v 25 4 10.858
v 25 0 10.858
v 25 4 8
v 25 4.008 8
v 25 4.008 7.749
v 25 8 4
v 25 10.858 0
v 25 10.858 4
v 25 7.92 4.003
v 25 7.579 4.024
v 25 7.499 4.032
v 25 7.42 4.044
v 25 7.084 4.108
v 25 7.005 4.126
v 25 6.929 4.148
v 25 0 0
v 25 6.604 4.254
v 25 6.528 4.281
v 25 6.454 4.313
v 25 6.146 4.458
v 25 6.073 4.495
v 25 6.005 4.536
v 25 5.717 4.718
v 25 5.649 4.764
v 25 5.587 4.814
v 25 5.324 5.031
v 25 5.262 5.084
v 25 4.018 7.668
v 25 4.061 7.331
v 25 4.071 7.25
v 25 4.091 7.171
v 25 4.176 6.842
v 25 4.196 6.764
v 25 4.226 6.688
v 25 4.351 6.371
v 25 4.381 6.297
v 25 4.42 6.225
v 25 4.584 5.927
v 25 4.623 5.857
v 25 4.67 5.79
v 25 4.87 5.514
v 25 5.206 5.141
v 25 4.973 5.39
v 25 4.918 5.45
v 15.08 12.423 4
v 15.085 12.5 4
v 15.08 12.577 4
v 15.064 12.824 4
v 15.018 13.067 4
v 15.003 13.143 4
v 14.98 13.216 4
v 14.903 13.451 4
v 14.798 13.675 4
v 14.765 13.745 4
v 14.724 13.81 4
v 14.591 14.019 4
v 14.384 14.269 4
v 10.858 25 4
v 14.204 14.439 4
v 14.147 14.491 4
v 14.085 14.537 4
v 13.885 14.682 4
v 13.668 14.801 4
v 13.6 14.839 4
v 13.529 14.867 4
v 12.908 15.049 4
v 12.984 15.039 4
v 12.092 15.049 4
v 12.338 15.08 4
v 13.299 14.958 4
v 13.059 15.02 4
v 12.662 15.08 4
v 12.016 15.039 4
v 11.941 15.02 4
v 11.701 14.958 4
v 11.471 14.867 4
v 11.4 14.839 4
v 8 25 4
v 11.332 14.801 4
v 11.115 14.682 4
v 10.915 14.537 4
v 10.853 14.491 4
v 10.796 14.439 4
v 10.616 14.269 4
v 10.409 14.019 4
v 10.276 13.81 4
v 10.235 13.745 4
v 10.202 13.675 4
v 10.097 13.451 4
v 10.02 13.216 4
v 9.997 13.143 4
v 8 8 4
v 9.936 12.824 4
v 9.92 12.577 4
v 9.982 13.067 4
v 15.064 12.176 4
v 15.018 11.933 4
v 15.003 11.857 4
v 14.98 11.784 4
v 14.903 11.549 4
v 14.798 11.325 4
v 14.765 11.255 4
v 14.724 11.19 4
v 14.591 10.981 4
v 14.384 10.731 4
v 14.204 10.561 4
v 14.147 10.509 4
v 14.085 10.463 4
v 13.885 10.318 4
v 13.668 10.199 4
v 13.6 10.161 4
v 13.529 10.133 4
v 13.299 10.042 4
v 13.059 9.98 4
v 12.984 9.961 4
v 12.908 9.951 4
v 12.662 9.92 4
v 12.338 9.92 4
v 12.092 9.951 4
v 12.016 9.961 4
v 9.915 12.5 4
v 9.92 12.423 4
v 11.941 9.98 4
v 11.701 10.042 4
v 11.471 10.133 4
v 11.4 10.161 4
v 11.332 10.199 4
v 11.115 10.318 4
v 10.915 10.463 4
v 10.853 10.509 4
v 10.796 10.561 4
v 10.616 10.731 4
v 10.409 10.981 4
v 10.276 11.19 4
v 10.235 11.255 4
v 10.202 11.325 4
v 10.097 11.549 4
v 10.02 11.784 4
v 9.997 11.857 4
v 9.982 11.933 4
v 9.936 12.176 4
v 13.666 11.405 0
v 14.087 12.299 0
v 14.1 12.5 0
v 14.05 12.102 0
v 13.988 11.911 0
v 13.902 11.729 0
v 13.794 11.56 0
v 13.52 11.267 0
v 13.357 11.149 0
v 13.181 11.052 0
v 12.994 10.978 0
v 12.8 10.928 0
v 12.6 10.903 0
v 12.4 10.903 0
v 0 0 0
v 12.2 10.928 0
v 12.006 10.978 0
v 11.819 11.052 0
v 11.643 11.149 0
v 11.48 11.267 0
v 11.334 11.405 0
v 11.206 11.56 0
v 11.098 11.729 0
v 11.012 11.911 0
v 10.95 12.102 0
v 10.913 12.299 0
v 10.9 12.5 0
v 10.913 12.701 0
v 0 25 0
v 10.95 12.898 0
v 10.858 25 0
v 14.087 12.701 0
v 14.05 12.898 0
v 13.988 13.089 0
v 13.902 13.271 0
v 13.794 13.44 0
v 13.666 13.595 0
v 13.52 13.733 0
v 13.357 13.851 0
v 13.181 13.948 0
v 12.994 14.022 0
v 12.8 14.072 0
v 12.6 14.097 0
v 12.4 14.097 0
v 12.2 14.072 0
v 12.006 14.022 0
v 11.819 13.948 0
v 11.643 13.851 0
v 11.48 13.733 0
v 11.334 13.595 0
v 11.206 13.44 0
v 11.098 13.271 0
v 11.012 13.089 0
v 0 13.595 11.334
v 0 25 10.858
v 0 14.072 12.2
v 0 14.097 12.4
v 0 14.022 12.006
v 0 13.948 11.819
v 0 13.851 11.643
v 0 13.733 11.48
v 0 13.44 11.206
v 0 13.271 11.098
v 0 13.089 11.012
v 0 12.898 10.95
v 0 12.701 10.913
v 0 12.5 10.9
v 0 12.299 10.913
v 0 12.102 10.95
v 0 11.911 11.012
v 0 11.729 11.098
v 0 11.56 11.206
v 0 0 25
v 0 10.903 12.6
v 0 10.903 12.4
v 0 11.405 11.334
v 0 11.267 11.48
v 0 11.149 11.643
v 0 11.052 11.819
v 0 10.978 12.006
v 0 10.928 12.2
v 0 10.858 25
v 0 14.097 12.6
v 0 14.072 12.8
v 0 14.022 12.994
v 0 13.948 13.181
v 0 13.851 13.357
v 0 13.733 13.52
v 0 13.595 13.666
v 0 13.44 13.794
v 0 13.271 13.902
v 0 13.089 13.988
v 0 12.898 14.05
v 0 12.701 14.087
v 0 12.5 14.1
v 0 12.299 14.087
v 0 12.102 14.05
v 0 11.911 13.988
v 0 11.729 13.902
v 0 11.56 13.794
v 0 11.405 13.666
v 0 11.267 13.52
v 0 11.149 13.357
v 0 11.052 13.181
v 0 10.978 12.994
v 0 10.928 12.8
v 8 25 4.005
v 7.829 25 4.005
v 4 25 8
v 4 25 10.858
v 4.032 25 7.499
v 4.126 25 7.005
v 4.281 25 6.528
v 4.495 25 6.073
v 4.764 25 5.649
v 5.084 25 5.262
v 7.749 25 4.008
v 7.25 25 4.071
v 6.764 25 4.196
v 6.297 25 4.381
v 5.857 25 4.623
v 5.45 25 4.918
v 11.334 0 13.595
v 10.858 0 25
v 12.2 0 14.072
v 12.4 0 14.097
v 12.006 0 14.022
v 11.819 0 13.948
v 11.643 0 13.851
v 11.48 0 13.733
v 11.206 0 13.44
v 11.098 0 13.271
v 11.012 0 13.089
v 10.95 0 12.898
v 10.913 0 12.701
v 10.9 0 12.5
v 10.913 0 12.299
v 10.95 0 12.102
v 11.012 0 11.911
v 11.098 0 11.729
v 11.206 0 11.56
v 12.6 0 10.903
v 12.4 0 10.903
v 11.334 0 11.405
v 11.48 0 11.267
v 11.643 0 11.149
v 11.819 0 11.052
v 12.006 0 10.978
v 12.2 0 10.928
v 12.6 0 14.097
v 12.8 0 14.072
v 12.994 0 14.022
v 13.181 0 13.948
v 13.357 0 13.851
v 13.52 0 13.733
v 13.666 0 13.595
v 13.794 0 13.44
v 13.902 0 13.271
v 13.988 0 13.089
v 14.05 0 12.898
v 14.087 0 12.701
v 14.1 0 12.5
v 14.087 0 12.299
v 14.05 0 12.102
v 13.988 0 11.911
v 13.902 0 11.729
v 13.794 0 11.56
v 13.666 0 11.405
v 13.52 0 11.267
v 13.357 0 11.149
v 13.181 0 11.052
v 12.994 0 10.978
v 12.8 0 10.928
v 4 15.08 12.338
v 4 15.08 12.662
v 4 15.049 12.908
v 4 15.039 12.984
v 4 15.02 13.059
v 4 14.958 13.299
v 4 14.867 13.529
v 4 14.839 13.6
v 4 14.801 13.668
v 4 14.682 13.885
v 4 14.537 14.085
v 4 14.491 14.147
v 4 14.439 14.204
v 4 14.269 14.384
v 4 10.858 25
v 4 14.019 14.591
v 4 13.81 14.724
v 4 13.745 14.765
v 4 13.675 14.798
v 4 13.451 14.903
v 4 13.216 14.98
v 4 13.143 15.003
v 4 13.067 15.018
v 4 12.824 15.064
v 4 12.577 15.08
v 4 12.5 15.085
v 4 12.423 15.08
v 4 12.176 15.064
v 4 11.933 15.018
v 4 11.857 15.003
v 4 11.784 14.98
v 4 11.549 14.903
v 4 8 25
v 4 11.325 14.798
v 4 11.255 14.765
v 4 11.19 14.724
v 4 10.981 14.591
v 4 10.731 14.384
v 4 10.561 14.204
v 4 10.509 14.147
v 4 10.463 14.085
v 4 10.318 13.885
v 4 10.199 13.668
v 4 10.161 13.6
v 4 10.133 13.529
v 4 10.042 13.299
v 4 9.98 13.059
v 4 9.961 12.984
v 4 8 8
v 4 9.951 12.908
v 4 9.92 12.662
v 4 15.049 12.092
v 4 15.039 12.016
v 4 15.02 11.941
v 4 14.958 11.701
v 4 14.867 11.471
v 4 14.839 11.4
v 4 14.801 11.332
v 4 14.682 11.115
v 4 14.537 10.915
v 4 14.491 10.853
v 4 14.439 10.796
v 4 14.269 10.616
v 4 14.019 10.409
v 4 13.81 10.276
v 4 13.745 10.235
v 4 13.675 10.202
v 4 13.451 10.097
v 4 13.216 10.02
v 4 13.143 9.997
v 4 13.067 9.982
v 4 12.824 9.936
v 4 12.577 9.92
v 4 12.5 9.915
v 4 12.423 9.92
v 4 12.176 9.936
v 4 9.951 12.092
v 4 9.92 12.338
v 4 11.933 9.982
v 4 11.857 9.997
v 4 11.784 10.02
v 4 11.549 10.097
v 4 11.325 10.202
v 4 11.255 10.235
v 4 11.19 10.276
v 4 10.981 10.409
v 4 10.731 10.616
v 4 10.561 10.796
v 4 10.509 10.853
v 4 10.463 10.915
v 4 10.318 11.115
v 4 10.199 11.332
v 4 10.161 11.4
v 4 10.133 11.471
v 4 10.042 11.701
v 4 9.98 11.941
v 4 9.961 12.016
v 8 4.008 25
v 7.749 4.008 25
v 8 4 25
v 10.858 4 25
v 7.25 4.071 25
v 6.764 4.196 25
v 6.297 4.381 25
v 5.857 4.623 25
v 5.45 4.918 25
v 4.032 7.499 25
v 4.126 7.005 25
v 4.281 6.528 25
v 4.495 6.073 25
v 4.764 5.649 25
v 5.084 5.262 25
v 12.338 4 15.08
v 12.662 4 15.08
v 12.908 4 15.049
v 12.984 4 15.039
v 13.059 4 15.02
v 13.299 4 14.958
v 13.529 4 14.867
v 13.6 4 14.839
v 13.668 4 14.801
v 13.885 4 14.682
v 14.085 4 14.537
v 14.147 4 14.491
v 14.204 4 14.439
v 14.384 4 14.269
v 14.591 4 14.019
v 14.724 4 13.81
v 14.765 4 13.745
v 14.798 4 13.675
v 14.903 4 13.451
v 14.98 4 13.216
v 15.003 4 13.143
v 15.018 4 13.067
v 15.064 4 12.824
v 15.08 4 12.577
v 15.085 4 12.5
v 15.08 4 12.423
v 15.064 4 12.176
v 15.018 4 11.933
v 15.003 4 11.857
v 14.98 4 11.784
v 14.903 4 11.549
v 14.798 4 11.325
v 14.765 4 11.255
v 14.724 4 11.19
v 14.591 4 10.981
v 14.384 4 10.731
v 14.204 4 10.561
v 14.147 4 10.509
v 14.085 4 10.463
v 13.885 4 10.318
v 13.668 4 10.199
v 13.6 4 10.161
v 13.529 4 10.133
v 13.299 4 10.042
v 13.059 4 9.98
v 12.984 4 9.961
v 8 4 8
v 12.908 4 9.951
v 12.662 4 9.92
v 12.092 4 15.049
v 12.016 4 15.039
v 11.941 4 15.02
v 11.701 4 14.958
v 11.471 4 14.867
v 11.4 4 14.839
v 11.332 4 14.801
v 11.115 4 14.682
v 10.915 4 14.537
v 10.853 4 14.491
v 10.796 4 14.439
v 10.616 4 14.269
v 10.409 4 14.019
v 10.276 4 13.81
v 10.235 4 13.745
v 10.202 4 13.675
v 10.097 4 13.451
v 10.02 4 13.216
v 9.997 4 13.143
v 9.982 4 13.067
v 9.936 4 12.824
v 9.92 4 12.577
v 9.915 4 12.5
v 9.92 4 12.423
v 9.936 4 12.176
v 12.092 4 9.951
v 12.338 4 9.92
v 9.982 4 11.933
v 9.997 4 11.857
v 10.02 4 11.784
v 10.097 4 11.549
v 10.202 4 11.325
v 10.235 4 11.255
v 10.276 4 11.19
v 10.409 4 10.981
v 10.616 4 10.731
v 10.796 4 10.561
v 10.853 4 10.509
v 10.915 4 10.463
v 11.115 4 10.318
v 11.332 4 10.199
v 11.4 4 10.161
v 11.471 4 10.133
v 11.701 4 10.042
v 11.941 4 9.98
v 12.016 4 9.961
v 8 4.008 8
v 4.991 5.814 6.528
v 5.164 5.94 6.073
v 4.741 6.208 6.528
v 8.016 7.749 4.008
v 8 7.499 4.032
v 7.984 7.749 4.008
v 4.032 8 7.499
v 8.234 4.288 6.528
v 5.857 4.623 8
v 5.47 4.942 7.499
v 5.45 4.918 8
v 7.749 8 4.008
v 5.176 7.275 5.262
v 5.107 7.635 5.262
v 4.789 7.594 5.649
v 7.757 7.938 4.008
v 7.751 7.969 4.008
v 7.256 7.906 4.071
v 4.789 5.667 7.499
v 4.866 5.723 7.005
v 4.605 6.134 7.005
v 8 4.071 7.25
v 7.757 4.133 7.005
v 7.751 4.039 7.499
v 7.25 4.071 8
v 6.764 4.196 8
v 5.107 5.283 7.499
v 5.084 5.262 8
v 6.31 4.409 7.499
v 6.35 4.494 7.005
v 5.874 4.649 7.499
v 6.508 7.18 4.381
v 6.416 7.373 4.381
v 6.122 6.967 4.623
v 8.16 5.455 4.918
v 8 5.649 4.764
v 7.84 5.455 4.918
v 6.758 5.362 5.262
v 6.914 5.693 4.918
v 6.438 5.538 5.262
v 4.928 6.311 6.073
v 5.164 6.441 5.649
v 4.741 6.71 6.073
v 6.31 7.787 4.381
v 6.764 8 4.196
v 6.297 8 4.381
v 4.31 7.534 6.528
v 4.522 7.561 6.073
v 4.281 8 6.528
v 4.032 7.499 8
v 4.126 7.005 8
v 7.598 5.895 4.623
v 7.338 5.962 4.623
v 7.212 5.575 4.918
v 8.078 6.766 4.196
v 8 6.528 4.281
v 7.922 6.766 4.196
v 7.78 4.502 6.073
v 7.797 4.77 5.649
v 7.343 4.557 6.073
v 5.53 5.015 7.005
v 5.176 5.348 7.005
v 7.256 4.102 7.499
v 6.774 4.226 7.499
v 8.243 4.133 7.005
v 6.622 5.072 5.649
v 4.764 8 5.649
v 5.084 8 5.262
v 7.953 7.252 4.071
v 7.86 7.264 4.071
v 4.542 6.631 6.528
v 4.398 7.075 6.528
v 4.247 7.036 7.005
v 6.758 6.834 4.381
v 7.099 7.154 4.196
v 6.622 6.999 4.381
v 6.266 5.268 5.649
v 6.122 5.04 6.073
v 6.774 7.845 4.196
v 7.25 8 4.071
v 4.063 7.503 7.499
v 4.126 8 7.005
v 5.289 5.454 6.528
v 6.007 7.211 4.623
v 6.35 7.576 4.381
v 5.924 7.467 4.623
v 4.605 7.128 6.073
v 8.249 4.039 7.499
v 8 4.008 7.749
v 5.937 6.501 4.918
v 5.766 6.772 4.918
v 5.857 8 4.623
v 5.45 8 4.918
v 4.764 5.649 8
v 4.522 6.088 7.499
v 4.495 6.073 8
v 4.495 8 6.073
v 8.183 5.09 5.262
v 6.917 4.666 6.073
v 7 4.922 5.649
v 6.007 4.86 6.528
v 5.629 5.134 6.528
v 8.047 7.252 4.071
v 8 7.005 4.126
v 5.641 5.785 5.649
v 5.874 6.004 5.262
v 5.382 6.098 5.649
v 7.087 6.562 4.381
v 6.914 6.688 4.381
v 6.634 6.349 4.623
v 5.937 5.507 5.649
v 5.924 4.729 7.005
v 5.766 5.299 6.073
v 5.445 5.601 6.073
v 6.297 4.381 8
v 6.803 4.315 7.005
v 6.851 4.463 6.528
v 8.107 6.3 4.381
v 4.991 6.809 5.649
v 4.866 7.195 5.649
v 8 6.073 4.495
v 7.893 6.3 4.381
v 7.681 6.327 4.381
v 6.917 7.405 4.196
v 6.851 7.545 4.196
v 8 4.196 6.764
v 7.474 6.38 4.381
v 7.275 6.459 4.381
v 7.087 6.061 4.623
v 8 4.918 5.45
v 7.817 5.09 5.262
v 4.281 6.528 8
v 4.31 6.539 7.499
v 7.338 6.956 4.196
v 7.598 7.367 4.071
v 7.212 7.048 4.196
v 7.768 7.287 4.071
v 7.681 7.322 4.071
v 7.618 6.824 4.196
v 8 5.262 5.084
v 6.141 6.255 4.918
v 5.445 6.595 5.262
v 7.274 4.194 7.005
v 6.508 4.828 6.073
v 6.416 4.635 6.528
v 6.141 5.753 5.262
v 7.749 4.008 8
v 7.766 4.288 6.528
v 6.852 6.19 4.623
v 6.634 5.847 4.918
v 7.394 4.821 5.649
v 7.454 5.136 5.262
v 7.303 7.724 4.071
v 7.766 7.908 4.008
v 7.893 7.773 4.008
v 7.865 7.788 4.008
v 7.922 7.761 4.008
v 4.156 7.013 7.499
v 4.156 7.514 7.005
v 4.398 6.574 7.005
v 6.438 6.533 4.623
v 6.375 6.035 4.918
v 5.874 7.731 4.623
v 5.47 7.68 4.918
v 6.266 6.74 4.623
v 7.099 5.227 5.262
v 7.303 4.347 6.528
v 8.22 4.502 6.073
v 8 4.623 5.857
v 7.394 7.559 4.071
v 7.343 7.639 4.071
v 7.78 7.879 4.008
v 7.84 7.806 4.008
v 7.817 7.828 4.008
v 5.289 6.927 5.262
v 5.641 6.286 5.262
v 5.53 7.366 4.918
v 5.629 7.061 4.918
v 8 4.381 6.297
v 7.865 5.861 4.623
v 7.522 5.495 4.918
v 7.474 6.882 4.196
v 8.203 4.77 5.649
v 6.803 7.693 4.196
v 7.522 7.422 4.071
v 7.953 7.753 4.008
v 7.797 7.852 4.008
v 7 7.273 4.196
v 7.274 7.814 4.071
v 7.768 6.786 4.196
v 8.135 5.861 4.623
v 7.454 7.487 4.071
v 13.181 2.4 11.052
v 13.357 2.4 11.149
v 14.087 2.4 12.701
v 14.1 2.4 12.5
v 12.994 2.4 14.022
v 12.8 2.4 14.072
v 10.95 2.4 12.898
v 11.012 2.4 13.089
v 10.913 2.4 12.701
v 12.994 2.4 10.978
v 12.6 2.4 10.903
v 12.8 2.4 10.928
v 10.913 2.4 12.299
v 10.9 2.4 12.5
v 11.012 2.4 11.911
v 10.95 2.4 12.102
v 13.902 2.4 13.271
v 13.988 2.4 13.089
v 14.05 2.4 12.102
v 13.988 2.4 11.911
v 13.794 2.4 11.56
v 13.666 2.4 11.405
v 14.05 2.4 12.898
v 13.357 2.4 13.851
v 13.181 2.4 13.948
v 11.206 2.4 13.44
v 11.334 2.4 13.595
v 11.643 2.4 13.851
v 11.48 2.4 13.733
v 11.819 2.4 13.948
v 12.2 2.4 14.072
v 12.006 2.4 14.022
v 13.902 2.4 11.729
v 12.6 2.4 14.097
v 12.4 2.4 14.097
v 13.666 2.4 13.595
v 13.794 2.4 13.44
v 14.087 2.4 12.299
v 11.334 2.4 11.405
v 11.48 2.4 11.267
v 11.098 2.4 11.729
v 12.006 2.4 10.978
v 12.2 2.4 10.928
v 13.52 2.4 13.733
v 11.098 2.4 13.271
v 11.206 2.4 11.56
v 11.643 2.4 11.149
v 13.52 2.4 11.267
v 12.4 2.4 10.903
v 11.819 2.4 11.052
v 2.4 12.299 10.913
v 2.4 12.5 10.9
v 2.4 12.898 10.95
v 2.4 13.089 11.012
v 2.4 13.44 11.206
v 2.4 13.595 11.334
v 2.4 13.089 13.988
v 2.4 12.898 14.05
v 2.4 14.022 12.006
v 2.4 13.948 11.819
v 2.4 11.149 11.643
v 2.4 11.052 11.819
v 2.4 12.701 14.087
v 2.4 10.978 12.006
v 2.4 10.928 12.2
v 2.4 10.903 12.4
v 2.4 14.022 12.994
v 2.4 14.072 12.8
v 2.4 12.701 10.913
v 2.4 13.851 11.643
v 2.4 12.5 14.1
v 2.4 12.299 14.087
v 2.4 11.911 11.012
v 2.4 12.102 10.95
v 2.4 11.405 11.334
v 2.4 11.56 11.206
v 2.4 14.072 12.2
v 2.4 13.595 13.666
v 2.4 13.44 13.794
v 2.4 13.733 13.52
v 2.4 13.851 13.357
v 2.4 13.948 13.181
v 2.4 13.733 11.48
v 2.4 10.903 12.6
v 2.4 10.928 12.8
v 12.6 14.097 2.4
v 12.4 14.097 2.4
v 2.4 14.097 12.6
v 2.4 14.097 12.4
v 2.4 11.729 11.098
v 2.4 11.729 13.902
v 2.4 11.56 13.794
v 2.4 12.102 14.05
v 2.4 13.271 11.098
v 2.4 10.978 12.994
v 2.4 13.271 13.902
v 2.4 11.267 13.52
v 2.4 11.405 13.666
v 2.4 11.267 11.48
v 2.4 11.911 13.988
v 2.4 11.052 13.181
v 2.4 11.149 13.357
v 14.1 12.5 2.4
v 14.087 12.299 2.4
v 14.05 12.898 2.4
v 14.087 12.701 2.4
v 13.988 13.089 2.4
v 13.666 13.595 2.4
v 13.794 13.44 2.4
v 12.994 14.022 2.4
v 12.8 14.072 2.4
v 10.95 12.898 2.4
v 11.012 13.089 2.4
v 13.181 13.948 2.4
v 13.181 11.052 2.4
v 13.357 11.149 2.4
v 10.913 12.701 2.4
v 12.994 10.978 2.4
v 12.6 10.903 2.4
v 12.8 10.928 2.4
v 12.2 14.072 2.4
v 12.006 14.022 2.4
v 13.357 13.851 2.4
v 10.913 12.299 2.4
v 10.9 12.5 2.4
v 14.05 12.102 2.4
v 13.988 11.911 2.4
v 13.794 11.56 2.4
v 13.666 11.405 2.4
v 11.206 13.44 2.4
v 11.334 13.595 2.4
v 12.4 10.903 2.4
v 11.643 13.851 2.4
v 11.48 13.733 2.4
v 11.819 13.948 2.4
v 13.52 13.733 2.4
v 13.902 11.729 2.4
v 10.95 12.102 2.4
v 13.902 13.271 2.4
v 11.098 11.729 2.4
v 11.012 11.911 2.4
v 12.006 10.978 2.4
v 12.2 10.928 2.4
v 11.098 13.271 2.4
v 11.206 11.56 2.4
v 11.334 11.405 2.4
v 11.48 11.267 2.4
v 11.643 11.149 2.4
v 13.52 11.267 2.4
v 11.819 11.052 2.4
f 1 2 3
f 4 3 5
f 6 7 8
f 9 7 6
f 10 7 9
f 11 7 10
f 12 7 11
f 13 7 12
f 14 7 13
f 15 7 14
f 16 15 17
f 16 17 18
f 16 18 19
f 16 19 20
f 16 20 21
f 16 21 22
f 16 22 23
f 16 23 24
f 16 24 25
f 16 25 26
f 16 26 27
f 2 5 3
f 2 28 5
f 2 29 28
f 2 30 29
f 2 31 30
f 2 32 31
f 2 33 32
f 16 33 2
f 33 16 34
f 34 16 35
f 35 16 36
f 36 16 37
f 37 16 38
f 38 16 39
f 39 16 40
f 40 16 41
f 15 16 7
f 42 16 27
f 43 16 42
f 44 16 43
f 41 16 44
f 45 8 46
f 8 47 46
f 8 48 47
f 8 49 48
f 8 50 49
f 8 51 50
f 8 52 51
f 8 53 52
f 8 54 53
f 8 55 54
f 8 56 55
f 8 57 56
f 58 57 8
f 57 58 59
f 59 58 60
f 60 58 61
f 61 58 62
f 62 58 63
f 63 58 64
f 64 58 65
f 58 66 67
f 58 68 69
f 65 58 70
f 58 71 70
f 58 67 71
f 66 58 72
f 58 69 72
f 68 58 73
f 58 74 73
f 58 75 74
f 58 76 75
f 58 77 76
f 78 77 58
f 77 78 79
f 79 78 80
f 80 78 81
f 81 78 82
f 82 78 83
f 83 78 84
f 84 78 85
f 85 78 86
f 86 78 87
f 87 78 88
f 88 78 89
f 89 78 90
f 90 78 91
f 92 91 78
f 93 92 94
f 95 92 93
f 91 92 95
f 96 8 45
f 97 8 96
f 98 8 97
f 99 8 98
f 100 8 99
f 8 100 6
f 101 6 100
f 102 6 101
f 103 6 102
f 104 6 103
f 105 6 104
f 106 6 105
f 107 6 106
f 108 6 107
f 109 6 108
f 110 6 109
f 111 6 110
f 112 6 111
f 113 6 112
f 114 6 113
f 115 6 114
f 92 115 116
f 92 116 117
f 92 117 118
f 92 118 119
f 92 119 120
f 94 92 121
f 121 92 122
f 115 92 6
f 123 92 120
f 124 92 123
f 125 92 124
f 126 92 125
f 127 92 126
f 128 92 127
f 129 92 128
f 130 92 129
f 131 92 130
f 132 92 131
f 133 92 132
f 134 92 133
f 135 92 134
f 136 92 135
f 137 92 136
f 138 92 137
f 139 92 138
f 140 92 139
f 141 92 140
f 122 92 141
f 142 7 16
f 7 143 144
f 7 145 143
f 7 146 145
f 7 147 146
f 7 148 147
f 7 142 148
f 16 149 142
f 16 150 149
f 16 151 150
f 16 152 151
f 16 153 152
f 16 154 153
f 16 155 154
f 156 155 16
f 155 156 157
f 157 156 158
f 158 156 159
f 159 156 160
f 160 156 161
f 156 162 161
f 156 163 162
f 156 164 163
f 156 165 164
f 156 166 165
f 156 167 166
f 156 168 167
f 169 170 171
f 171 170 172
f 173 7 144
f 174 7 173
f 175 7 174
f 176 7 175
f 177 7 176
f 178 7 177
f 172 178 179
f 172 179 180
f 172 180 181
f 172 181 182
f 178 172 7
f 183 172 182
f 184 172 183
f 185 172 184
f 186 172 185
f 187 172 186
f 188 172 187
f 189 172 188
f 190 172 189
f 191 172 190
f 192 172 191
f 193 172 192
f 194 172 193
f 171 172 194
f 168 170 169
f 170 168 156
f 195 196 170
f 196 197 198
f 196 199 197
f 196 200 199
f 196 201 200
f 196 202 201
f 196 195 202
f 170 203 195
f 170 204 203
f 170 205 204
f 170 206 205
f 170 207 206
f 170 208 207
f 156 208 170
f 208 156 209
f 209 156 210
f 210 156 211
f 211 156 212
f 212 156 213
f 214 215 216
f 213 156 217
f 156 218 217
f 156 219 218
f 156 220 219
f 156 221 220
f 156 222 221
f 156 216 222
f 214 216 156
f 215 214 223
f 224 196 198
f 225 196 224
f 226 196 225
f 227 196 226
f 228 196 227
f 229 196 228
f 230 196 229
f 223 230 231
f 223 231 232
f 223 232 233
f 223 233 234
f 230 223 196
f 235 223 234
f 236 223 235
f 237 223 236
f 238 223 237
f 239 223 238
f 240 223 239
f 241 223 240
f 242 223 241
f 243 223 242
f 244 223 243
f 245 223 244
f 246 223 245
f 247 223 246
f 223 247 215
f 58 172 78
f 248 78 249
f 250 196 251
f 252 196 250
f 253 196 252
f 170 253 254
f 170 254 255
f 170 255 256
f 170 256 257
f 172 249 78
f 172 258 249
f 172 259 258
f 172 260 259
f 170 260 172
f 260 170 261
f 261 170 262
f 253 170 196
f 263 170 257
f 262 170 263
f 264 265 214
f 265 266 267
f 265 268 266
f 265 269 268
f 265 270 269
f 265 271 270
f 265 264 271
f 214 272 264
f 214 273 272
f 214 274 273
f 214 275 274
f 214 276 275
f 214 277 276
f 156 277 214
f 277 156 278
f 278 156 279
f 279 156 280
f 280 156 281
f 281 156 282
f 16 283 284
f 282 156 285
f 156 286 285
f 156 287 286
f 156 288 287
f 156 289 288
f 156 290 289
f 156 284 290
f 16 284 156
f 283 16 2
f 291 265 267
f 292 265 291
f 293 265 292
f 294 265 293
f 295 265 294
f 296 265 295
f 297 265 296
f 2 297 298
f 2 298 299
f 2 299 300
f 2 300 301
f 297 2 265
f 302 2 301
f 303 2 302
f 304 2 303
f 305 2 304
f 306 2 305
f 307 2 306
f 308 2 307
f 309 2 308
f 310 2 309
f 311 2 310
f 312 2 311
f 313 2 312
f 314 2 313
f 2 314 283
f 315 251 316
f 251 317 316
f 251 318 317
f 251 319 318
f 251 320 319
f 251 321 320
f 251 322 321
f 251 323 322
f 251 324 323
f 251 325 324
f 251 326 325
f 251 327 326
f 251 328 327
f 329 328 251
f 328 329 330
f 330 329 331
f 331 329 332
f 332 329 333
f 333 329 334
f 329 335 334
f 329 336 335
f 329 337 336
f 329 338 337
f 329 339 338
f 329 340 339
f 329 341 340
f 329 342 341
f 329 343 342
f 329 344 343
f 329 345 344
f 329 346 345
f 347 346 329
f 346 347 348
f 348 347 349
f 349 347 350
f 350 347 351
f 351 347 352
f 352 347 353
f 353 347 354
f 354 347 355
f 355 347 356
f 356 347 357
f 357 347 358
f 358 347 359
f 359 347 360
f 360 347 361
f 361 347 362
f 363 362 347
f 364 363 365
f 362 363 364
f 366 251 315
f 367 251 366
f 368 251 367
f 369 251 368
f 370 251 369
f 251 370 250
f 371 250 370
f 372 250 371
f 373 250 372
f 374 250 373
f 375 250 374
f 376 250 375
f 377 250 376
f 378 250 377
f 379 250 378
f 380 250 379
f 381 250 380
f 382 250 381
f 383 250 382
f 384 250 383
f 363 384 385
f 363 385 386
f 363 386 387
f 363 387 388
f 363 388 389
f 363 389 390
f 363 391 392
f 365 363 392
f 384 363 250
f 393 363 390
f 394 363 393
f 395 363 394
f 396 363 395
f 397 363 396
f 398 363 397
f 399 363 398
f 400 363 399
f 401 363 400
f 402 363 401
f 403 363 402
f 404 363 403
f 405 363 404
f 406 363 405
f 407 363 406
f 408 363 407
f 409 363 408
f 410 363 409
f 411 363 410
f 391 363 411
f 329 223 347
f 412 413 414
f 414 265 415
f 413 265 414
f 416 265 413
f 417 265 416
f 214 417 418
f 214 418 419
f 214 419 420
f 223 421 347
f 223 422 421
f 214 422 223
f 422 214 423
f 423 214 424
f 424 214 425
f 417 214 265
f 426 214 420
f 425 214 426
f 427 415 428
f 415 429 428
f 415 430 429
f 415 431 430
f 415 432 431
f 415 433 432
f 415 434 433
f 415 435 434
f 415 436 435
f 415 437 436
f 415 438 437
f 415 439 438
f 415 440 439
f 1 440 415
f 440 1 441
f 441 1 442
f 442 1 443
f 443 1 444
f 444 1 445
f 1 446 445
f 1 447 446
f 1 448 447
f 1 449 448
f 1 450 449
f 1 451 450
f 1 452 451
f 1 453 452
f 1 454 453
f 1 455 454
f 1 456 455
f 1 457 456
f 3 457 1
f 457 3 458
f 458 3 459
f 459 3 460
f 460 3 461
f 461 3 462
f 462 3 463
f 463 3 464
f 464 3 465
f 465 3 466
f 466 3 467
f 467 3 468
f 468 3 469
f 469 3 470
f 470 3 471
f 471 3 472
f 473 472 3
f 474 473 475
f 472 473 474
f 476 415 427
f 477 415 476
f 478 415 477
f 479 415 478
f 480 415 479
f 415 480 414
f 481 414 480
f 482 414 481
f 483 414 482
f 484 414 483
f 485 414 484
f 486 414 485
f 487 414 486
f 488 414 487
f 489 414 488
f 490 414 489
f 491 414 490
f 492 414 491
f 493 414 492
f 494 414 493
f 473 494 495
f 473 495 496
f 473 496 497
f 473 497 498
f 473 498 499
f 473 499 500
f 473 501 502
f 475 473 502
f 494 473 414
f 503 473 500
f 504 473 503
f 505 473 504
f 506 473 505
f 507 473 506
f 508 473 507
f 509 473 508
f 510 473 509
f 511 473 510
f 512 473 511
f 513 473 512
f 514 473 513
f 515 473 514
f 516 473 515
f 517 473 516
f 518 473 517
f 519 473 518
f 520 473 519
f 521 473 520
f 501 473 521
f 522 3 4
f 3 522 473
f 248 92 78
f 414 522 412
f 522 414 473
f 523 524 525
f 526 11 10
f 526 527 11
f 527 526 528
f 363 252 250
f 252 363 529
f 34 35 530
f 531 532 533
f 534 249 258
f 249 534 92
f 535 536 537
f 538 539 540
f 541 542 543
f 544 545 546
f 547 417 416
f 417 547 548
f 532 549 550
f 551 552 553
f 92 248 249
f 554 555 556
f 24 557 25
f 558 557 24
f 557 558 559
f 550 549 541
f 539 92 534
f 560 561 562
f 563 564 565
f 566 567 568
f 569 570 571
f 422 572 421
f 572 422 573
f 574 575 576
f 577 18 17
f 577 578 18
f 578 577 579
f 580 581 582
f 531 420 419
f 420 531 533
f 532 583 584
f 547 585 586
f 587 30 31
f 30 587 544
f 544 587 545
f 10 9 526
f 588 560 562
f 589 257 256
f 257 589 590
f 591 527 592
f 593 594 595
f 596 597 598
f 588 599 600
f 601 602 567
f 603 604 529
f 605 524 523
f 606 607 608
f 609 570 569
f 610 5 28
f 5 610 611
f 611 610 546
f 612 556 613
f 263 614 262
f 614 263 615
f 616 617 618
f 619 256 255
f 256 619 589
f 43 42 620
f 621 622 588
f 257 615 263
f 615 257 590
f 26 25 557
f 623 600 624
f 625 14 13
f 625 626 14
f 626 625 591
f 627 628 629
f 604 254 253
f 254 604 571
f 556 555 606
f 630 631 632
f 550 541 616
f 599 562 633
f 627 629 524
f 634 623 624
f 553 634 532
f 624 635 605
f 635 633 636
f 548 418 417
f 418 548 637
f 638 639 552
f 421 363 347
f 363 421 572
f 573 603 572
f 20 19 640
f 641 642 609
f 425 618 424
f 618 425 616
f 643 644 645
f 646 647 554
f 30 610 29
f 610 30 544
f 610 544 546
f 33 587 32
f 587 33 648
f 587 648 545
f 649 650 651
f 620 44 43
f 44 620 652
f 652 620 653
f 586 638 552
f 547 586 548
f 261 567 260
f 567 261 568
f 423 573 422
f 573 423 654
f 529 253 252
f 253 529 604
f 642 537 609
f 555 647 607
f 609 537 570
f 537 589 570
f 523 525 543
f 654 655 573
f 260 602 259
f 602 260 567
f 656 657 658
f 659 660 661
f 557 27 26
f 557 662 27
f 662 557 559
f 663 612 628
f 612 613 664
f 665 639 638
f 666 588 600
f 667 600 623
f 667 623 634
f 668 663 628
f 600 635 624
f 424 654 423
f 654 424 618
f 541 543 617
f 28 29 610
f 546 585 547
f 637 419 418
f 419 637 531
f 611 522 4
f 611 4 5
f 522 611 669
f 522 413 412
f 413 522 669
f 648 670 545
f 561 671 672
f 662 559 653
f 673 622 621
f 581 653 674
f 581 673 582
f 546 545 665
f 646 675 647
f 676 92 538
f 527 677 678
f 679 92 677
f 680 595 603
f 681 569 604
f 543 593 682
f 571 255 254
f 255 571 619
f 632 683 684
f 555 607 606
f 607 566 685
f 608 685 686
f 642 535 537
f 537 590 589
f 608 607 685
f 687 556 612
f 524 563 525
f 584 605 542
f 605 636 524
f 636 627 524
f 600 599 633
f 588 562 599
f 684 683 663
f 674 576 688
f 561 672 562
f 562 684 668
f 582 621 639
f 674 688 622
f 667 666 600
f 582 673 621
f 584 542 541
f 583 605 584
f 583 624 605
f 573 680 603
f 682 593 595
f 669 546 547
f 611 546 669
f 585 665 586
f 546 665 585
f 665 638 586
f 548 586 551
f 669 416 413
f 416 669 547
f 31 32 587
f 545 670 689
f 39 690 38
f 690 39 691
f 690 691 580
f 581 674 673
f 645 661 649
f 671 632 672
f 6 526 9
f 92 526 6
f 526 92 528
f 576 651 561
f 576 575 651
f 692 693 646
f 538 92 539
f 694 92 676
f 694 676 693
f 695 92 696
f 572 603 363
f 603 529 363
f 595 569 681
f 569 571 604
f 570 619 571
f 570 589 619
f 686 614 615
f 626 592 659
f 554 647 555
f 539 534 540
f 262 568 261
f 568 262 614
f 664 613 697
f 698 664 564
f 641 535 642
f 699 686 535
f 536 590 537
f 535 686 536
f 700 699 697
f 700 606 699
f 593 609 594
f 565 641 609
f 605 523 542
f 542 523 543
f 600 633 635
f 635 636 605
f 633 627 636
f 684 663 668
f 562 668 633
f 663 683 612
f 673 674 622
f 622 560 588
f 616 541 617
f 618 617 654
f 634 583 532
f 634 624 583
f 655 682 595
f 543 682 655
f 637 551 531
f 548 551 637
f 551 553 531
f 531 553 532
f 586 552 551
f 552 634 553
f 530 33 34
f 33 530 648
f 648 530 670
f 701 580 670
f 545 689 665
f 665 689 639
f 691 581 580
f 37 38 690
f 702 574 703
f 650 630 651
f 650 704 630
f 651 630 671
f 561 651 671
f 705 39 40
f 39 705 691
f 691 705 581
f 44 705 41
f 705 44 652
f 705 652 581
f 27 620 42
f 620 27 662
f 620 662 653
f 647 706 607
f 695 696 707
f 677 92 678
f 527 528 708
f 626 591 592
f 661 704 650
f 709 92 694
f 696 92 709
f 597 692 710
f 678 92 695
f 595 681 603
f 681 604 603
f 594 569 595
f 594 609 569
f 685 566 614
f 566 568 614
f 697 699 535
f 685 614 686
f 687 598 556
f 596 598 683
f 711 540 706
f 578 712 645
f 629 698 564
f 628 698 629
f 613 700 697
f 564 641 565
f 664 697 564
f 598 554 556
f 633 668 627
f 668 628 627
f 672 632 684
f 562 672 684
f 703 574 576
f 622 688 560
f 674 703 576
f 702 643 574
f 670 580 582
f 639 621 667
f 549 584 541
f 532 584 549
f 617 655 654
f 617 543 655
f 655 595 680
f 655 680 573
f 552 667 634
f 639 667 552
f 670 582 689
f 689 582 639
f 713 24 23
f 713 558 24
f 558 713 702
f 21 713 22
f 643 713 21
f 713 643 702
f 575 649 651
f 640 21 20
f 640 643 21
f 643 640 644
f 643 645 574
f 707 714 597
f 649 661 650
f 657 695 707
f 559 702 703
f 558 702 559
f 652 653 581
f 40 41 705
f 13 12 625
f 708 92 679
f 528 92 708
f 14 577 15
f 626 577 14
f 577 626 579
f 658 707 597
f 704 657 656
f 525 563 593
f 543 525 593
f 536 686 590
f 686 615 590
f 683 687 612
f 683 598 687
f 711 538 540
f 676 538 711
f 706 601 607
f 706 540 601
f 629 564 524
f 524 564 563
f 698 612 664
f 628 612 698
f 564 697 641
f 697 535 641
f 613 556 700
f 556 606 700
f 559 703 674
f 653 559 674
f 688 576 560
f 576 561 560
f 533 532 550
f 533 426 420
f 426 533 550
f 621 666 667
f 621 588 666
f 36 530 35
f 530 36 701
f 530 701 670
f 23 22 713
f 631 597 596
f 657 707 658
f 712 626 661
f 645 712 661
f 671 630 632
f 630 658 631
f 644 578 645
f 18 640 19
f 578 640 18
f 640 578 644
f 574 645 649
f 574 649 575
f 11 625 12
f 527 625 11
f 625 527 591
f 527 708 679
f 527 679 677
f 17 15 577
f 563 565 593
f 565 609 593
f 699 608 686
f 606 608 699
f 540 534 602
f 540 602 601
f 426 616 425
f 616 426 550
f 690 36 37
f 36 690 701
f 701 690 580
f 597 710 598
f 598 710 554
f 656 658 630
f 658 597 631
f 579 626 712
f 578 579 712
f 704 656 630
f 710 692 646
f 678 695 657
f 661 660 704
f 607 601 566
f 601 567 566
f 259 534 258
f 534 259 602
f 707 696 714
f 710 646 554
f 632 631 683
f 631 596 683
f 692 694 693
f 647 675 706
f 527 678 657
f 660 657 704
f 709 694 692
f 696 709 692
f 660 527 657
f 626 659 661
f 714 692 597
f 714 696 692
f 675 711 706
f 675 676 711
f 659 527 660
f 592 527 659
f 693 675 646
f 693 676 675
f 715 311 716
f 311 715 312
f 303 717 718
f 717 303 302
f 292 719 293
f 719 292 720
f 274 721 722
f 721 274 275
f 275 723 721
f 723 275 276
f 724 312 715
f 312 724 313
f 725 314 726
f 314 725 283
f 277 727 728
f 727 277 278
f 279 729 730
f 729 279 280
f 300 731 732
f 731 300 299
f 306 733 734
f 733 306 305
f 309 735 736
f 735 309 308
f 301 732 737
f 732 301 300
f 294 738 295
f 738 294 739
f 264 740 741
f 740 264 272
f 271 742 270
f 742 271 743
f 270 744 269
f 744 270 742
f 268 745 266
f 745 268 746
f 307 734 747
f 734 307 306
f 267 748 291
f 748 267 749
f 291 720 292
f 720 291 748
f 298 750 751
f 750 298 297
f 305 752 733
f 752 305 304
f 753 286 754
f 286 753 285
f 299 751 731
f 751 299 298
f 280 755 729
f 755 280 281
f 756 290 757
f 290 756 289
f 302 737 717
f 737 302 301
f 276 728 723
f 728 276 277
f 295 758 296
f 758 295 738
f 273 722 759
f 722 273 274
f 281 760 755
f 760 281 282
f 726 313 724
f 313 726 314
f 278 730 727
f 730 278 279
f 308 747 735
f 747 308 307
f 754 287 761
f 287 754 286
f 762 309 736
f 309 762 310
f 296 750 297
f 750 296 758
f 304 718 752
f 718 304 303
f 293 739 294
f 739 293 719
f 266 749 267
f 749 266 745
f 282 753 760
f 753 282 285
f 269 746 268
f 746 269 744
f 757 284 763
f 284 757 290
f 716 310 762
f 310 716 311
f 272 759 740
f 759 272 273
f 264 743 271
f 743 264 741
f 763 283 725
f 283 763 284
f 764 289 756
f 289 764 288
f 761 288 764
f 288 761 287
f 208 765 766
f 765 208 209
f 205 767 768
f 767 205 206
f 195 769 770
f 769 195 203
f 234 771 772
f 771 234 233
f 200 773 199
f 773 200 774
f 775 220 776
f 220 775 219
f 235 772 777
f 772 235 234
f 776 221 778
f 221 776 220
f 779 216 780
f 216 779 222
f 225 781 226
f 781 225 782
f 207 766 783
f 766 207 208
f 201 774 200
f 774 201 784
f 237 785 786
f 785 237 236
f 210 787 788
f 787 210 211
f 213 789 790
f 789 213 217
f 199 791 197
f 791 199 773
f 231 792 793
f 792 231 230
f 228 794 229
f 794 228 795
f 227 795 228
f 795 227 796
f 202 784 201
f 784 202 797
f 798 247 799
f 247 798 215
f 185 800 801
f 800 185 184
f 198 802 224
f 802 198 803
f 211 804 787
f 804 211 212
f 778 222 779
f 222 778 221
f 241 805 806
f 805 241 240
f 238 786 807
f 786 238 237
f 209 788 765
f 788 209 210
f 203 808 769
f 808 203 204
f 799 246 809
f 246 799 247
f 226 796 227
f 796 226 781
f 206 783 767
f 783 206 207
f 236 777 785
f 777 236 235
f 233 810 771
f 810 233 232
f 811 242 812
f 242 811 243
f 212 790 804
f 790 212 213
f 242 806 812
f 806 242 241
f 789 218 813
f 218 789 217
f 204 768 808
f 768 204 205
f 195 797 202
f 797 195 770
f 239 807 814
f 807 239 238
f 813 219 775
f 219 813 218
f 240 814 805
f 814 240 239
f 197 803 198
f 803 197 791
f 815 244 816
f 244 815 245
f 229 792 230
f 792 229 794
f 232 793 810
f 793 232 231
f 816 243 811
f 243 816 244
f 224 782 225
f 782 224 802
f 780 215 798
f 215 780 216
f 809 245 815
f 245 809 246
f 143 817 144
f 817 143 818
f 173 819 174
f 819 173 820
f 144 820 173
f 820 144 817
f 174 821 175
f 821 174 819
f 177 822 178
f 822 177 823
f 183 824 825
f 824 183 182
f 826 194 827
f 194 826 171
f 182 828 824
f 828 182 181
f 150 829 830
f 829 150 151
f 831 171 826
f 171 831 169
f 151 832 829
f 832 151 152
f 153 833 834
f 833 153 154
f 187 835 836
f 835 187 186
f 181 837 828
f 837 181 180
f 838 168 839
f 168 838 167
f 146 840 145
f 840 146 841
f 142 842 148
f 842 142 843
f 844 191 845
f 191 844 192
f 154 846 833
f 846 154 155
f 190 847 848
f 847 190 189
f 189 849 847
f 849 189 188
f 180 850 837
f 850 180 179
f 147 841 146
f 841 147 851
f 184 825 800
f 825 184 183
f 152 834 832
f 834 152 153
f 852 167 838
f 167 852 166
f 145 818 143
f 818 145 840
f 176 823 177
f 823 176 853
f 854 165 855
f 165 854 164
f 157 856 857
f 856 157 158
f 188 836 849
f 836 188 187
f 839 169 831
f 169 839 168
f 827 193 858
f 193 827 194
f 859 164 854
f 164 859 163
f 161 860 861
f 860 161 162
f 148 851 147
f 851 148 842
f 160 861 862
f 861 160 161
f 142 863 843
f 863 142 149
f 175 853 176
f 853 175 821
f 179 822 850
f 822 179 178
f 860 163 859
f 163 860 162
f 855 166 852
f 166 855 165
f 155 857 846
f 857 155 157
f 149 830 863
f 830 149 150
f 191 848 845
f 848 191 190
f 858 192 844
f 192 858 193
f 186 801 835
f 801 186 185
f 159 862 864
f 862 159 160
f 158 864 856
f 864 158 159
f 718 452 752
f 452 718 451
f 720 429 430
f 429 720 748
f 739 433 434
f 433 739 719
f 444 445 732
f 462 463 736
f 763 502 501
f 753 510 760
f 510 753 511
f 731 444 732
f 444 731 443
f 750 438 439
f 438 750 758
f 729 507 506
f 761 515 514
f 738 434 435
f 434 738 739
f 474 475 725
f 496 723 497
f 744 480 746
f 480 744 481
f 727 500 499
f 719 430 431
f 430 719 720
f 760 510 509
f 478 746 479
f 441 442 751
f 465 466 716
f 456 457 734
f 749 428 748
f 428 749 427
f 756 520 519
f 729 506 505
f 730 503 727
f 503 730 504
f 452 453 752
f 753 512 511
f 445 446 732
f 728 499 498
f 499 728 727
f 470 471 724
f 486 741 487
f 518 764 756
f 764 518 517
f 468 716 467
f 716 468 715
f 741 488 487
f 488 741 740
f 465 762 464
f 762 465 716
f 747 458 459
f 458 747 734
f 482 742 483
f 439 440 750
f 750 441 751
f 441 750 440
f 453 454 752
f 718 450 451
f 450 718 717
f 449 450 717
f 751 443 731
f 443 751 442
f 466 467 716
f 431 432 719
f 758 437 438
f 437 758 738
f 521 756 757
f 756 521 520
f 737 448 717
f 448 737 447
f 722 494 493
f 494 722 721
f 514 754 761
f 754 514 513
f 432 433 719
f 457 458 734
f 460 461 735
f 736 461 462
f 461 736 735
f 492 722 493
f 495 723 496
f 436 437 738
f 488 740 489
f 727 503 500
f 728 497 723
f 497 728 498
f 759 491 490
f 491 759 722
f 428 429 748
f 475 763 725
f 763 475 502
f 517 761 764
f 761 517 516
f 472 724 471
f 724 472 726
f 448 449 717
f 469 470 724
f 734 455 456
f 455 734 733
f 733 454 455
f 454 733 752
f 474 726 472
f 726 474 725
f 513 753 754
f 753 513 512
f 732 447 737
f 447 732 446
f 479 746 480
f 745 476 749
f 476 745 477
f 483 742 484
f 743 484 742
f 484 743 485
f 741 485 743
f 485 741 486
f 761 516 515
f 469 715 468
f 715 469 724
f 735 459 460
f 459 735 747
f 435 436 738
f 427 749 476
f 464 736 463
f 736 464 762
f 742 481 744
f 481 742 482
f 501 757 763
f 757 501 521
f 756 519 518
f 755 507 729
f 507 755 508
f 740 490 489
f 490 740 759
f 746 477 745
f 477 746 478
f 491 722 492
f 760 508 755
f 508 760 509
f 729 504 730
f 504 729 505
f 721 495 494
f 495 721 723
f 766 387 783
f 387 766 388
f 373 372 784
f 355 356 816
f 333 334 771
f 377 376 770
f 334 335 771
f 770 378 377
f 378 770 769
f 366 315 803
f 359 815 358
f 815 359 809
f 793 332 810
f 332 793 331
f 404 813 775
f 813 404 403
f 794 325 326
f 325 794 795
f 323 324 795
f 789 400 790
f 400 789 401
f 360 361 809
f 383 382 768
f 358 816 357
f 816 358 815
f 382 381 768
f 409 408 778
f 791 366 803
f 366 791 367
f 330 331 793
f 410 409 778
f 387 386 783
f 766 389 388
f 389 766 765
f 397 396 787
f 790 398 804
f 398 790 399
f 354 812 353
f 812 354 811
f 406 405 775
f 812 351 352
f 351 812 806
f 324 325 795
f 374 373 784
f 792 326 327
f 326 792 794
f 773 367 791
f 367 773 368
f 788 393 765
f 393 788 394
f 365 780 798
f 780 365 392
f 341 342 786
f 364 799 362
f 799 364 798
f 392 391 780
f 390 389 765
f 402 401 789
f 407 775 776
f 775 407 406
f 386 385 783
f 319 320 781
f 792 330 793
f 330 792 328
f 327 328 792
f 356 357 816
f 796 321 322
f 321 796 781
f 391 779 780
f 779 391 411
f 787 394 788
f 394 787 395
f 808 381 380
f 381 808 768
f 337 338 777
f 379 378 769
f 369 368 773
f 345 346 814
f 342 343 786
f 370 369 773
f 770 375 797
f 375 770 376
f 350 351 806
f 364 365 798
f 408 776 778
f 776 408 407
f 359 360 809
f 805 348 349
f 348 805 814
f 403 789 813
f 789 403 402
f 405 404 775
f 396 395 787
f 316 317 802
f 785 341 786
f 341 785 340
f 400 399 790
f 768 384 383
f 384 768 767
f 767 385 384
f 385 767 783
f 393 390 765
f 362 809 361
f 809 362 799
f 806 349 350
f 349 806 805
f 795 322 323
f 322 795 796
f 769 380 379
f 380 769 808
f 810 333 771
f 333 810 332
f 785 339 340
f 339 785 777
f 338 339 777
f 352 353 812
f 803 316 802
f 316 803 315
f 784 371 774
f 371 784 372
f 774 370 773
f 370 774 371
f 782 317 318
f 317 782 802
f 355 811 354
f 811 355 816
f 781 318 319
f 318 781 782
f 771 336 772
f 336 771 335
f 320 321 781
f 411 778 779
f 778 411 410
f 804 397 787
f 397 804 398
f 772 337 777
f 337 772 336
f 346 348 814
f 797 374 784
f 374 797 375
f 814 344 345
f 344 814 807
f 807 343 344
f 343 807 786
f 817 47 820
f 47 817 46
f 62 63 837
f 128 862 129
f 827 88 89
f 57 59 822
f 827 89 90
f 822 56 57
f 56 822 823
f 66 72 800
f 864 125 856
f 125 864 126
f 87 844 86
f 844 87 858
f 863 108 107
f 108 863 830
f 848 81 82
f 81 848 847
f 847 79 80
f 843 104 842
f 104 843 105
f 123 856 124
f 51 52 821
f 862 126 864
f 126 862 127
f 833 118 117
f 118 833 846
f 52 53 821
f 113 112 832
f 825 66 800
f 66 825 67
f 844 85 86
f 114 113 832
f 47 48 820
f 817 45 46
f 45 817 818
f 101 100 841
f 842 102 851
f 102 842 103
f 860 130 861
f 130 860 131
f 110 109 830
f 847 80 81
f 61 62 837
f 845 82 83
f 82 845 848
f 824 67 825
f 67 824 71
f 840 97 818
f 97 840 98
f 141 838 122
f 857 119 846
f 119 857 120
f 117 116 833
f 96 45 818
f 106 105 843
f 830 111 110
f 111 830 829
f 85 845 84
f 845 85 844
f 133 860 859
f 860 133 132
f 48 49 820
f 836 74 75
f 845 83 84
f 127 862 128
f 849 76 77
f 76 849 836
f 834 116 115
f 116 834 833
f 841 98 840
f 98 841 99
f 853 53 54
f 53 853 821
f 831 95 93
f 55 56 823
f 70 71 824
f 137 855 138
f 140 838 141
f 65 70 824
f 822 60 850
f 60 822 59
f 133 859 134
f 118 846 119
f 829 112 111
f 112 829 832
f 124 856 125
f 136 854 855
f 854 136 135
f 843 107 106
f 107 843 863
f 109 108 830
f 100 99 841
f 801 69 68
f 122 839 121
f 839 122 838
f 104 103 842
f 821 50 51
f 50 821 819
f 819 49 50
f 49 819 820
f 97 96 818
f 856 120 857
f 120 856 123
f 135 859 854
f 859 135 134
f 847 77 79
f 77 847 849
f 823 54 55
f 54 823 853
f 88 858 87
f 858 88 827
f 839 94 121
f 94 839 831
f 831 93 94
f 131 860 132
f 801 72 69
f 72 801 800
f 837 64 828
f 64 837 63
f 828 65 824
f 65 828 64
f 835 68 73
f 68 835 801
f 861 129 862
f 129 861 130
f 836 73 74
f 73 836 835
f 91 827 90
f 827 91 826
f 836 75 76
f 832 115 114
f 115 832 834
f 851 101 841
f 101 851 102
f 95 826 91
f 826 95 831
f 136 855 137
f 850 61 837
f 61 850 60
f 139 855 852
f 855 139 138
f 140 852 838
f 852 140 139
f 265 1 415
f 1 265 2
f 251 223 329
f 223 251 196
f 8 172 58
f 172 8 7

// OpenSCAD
$fn=50;
/* Base */
a=25;
d=4;
r=1.6;

base(a=a,d=d,r=r);

module base(a,d,r) {


    difference() {
        kose(a=a,d=d);
        union() {
            delik(r=r,a=a,d=d);
            pah(r=r,a=a,d=d);
        }
        color([0.4,0.5,0.8,1.0]) union() {
            w=a*0.8;
            translate([a,0,a]) rotate([90,0,0]) rotate([0,0,45]) cube(size=[w,w,3*d],center=true);
            translate([0,a,a]) rotate([0,90,0]) rotate([0,0,45]) cube(size=[w,w,3*d],center=true);
            translate([a,a,0]) rotate([0,0,0]) rotate([0,0,45])  cube(size=[w,w,3*d],center=true);
        }
    }
}
module kose(a,d) {
    color([0.4,0.5,0.8,1.0])
    difference () {
        union() {
            cube(size=[a,a,d]);
            translate([0,0,d]) cube(size=[d,a,a-d]);
            translate([d,0,d]) cube(size=[a-d,d,a-d]);
            translate([d,d,d]) cube(size=[a-d,d,d]);
            translate([d,2*d,d]) cube(size=[d,a-2*d,d]);
            translate([d,d,2*d]) cube(size=[d,d,a-2*d]);
        }

        translate([2*d,2*d,2*d]) 
        hull() {
            rotate([0,90,0]) cylinder(r=d*1.0,h=a);
            rotate([-90,0,0]) cylinder(r=d*1.0,h=a);
            rotate([0,0,0]) cylinder(r=d*1.0,h=a);
            sphere(r=d);
        }
    }
    

}

module delik(r,a,d) {color([0.4,0.5,0.8,1.0])
union() {
    translate([a/2,0,a/2]) rotate([90,0,0]) cylinder(r=r,h=a,center=true);
    translate([0,a/2,a/2]) rotate([0,90,0]) cylinder(r=r,h=a,center=true);
    translate([a/2,a/2,0]) rotate([0,0,0]) cylinder(r=r,h=a,center=true);
}
}

module pah(r,a,d) {
    color([0.4,0.5,0.8,1.0])
    union () {
        translate([a/2,d-r,a/2]) rotate([270,0,0]) cylinder(r1=r,r2=2*r,h=r+1,center=false);
        translate([d-r,a/2,a/2]) rotate([0,90,0]) cylinder(r1=r,r2=2*r,h=r+1,center=false);
        translate([a/2,a/2,d-r]) rotate([0,0,0]) cylinder(r1=r,r2=2*r,h=r+1,center=false);
    }
}
